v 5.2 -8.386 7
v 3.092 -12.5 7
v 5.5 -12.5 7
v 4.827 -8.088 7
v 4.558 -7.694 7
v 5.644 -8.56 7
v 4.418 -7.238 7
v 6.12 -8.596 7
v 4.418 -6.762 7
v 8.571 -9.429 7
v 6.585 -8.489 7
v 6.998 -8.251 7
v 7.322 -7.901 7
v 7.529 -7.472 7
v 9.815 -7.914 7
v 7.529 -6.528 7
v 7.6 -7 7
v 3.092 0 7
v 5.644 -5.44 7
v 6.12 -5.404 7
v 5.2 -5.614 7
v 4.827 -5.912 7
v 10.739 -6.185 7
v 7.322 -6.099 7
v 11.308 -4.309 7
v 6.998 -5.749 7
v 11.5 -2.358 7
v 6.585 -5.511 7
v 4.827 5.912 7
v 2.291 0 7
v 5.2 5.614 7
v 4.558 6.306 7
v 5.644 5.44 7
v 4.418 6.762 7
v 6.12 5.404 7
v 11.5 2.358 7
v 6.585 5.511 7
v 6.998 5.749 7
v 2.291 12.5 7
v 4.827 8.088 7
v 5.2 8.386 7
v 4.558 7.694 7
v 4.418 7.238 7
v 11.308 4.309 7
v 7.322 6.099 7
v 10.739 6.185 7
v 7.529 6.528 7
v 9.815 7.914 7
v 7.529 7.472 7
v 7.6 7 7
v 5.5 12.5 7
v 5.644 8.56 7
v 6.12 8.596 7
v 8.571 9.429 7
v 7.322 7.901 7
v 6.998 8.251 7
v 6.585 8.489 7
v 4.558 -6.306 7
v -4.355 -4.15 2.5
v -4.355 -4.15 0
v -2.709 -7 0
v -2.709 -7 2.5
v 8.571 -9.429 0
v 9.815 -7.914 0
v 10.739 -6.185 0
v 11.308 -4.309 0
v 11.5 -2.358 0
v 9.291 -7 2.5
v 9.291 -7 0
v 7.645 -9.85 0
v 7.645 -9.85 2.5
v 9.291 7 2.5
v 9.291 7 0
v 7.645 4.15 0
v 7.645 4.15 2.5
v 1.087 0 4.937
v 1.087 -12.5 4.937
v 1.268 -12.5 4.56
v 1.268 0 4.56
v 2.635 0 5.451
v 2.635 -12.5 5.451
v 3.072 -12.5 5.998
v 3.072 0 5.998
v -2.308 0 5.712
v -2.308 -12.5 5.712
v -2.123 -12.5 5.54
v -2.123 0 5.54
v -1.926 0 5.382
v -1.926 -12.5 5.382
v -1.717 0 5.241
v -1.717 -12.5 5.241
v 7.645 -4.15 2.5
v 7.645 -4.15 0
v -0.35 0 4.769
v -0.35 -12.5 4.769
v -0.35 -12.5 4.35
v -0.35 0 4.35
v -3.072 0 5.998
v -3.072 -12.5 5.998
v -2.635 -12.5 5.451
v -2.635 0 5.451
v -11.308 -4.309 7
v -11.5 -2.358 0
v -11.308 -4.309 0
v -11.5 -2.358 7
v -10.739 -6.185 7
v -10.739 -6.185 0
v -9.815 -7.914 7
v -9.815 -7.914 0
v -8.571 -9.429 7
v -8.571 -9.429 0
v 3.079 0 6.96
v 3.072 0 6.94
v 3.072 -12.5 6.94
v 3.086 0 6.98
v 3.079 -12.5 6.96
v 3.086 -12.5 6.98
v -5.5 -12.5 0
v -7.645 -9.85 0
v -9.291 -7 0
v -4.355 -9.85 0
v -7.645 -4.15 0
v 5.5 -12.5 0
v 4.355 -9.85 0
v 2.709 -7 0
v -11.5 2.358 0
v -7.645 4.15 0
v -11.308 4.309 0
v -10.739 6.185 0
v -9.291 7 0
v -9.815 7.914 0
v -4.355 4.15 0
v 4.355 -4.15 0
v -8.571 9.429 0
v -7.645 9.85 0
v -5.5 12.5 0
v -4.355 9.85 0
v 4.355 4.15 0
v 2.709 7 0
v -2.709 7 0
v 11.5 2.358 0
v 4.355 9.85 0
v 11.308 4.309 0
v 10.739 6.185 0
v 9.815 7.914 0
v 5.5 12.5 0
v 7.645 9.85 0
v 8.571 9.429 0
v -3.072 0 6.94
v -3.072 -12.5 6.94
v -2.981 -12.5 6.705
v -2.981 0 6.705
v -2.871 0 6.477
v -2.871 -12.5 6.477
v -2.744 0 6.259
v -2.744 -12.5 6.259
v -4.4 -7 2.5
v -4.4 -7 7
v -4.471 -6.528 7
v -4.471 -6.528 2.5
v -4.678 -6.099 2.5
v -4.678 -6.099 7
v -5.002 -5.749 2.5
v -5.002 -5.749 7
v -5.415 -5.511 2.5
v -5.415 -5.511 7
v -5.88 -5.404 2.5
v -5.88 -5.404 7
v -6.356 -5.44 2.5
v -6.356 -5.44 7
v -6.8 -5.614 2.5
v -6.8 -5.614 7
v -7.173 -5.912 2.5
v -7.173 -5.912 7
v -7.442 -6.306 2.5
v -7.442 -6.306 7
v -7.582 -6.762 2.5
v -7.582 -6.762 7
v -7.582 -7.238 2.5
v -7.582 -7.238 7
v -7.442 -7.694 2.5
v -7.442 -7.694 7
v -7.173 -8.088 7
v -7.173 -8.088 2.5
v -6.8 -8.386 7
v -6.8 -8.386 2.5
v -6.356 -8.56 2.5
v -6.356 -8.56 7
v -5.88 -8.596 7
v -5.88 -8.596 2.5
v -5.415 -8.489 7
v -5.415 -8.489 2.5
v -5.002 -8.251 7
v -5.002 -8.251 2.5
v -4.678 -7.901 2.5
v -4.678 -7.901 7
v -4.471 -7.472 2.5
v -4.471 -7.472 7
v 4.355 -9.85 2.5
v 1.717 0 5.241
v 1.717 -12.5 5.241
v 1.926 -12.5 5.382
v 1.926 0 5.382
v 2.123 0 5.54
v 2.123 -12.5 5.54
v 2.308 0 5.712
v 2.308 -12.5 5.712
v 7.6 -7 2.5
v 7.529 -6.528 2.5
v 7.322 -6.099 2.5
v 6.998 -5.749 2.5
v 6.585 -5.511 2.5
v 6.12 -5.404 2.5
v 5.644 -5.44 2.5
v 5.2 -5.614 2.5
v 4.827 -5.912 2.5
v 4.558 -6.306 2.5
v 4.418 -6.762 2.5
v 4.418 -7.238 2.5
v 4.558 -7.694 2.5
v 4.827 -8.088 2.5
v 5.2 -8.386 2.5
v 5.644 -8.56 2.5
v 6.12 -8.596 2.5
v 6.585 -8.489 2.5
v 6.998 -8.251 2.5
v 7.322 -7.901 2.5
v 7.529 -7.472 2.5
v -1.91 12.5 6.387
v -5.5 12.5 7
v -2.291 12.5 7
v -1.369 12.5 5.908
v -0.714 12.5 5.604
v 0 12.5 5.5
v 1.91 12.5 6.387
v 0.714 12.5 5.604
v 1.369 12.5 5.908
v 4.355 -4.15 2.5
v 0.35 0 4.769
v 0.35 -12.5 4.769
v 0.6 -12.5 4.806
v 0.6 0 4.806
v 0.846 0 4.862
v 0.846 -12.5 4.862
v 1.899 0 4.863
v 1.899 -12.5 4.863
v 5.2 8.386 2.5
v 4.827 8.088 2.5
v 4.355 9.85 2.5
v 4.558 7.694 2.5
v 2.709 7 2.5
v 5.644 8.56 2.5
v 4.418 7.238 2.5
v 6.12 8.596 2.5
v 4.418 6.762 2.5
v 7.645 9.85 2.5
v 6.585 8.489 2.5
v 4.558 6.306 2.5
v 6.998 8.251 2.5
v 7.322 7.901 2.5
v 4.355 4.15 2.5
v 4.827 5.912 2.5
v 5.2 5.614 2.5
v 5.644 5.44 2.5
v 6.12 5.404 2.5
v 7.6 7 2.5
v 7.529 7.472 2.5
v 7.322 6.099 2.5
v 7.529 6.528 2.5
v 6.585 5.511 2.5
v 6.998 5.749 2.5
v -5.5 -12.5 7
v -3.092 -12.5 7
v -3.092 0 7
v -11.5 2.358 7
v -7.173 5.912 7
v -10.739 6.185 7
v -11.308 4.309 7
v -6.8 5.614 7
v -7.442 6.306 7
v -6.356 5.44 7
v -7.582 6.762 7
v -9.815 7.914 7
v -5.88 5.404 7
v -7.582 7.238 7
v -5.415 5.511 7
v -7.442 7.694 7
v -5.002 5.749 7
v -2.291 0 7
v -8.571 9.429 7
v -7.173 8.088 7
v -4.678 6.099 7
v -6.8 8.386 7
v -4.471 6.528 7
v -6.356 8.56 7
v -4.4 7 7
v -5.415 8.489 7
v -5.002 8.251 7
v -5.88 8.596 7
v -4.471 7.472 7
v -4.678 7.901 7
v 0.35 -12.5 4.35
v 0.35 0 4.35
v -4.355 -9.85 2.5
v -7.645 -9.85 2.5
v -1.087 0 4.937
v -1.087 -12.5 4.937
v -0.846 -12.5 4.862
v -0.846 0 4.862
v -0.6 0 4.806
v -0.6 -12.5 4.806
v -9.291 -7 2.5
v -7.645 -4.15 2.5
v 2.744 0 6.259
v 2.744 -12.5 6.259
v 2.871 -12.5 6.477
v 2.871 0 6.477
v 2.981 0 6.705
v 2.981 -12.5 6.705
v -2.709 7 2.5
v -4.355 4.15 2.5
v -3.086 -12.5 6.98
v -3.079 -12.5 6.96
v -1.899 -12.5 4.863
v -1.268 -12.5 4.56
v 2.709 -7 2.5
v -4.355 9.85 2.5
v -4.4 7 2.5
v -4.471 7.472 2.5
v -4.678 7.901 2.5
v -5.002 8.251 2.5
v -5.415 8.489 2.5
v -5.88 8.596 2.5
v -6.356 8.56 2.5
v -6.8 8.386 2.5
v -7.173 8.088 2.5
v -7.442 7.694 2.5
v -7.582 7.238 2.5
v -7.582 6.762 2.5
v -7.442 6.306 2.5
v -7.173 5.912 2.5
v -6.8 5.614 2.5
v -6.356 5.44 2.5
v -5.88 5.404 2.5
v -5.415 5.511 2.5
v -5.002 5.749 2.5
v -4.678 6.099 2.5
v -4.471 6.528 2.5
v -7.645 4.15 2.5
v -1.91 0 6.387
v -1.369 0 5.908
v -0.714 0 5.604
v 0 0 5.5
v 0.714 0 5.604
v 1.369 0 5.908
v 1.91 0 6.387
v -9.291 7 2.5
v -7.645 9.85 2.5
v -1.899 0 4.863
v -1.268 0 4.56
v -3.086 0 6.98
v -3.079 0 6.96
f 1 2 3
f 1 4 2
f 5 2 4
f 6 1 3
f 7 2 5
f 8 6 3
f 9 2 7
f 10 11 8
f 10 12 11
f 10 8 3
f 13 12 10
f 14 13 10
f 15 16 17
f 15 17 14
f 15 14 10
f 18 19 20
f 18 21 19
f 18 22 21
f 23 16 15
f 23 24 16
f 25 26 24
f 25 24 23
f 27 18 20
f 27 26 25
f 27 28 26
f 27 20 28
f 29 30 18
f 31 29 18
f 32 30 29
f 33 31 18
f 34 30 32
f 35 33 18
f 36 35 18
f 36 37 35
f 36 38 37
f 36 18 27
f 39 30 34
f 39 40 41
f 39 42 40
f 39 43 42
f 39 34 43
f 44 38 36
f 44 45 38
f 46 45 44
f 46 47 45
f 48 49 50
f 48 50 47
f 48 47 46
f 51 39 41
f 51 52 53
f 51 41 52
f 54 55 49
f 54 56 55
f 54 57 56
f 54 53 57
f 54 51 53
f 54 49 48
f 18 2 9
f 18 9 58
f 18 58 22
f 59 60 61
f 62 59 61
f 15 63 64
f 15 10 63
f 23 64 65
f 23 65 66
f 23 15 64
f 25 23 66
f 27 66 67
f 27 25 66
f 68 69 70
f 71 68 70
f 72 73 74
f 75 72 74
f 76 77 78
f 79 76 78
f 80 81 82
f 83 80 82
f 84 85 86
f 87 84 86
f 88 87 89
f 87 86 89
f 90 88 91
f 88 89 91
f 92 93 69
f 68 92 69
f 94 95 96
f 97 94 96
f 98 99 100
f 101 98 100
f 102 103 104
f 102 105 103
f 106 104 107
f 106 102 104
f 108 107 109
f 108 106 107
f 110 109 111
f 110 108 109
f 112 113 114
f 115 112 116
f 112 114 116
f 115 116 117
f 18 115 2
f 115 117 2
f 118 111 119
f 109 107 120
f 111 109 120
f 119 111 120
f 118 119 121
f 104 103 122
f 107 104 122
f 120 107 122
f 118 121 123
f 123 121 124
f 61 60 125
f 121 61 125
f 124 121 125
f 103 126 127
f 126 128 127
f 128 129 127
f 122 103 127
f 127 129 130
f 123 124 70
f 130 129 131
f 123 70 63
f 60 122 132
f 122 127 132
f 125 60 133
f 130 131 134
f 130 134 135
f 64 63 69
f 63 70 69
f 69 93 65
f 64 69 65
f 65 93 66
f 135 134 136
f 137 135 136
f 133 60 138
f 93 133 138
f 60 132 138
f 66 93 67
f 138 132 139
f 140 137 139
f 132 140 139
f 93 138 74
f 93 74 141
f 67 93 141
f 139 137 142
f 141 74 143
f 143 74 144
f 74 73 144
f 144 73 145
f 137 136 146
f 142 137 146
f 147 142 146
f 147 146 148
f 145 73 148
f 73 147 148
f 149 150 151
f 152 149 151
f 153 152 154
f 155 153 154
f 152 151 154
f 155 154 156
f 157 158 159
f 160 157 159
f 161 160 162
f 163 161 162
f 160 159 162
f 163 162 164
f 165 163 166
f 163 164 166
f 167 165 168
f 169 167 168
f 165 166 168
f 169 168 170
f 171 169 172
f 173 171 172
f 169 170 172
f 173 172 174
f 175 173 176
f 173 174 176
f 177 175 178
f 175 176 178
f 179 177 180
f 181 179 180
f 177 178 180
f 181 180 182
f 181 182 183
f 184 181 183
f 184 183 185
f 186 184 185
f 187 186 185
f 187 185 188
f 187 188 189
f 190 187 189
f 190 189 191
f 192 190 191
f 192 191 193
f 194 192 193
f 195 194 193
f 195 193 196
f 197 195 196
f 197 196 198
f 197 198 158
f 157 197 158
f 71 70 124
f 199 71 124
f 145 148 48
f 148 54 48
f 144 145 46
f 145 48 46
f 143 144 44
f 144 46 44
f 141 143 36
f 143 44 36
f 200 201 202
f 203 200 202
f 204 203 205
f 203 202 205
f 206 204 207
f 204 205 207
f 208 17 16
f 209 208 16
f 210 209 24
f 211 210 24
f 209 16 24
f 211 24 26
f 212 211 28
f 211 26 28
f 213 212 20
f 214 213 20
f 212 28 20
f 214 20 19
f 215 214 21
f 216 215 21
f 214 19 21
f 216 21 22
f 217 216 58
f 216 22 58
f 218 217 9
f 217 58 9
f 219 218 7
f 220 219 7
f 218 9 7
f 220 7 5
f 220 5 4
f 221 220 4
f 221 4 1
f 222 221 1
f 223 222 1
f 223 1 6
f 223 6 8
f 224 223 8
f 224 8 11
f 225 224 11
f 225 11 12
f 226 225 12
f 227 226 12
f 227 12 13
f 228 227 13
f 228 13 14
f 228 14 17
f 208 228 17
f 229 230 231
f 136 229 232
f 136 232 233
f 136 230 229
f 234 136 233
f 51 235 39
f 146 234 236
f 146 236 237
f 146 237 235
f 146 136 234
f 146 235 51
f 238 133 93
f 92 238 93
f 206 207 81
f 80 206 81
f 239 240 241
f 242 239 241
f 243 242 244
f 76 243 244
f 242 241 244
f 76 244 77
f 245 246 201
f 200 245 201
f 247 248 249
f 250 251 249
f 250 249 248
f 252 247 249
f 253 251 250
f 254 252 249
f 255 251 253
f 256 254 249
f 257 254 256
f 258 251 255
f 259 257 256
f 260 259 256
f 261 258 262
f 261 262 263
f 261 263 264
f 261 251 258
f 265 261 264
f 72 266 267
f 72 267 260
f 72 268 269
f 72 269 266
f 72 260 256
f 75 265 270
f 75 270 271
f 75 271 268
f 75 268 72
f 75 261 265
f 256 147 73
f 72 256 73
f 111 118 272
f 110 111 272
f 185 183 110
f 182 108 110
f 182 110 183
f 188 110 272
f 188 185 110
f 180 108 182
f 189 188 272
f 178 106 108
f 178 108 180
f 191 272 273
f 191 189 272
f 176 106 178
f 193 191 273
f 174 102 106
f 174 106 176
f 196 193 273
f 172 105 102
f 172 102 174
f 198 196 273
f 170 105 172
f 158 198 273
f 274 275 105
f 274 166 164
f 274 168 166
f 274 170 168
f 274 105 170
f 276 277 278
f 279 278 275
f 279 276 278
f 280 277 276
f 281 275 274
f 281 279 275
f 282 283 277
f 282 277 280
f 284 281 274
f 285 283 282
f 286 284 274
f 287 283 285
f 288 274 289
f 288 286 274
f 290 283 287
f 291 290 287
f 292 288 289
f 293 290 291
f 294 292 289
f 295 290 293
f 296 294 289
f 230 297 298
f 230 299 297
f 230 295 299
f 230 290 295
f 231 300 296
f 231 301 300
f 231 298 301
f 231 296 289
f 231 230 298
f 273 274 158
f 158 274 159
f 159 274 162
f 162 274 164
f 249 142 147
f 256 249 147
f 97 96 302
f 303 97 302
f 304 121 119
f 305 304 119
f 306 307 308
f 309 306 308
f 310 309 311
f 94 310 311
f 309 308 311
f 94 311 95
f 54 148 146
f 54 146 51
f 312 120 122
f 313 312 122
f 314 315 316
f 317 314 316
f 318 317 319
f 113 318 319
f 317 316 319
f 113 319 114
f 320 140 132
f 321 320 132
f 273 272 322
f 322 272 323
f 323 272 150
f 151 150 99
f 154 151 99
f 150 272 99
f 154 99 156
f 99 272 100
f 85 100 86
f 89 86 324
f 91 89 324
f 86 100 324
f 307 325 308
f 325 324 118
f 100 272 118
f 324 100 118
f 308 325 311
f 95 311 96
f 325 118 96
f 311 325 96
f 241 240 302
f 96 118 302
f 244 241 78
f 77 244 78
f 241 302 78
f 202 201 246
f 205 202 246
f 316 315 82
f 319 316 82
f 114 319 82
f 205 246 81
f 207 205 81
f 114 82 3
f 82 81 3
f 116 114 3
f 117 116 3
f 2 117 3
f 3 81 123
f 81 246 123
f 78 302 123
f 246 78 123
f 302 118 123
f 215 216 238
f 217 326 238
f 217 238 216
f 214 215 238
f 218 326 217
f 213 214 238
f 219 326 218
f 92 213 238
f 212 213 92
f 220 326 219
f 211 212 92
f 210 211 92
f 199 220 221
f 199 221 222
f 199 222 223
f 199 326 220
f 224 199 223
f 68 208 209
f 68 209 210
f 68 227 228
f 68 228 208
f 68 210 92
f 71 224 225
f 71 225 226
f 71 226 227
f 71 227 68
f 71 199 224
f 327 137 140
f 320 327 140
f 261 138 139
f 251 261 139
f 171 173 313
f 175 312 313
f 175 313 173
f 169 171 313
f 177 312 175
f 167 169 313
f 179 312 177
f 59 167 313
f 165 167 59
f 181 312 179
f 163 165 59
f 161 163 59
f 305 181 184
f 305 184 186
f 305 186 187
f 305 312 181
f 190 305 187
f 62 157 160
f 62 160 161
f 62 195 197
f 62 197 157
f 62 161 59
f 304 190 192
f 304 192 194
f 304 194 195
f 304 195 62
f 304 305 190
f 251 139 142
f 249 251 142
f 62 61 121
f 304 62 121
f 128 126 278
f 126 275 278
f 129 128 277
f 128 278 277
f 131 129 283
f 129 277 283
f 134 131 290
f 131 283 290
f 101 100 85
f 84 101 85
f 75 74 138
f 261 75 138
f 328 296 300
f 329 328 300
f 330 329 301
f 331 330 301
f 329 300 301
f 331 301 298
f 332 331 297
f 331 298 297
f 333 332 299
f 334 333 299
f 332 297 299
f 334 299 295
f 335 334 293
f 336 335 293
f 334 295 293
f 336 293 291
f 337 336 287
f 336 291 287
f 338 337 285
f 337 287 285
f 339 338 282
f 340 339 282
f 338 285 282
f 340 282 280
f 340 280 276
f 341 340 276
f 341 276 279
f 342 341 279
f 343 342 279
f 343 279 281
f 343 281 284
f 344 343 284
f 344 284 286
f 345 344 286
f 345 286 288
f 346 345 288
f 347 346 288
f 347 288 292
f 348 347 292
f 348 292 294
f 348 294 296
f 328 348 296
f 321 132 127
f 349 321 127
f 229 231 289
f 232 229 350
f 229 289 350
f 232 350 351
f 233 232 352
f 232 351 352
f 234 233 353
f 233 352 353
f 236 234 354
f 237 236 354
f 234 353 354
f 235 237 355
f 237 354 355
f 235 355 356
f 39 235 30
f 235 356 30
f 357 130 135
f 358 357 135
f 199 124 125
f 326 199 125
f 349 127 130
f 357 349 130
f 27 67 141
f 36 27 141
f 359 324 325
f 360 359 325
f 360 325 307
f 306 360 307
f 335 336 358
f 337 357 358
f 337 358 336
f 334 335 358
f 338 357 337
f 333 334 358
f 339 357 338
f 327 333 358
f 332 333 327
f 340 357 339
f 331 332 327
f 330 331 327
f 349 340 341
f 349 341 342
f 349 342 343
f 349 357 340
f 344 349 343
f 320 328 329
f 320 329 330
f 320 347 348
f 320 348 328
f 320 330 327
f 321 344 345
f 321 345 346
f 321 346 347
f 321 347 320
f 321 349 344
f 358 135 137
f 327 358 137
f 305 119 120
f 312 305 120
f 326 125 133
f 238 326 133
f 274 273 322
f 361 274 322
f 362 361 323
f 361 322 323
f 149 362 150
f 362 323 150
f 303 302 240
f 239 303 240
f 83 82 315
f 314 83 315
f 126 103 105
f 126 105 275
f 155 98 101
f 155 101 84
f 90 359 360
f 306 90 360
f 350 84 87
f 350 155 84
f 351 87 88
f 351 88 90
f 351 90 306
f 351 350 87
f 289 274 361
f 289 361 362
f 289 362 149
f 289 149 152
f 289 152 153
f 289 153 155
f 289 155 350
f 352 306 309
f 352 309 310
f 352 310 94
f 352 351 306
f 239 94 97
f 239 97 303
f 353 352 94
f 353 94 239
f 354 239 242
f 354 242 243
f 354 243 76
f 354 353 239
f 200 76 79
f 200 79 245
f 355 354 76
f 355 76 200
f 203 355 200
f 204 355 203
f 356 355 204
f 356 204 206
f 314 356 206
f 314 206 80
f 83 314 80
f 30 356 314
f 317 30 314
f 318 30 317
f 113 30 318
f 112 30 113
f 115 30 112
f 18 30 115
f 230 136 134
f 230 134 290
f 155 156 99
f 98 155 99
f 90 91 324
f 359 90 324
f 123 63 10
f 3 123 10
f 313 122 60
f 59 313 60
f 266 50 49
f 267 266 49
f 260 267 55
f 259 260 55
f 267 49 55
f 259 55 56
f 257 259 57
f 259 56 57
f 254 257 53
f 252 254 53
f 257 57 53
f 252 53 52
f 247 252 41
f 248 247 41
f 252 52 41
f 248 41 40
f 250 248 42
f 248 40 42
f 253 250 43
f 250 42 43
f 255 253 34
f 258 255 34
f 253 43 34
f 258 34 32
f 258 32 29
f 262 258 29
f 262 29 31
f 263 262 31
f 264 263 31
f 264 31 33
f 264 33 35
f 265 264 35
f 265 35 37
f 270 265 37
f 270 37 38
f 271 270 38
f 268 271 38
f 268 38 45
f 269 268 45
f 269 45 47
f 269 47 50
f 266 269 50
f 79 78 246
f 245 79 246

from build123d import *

# Parameters (mm, degrees)
F0_W      = 23
F0_H      = 25
F1_DEPTH  = 7
F3_DEPTH  = 25.001
F4_DEPTH  = 12.5
F5_SIZE   = 6
F6_R      = 10
F7_R      = 1.6
F8_DEPTH  = 25
F10_DEPTH = 2.5


with BuildPart() as f1:
    # F0 (on Top) → F1 (new body)
    with BuildSketch(Plane.XY):
        Rectangle(F0_W, F0_H)
    extrude(amount=F1_DEPTH)

    # F2 (on face) → F3 (cut, through all)
    with BuildSketch(Plane.XZ.offset(12.5)):
        with BuildLine():
            Line((0, 7), (-2.2912878475, 7))
            ThreePointArc((-2.2912878475, 7), (0, 5.5), (2.2912878475, 7))
            Line((2.2912878475, 7), (0, 7))
        make_face()
    extrude(amount=-F3_DEPTH, mode=Mode.SUBTRACT)

    # F2 (on face) → F4 (cut)
    with BuildSketch(Plane.XZ.offset(12.5)):
        with BuildLine():
            ThreePointArc((2.2912878475, 7), (0, 5.5), (-2.2912878475, 7))
            Line((-2.2912878475, 7), (-2.8084005449, 7))
            Line((-2.8084005449, 7), (-3.0722061624, 6.9397880893))
            ThreePointArc((-3.0722061624, 6.9397880893), (-2.9281488207, 6.5898778479), (-2.7443962613, 6.2590838157))
            Line((-2.7443962613, 6.2590838157), (-2.4464411557, 6.4966950836))
            Line((-2.4464411557, 6.4966950836), (-2.0099982944, 5.9494130458))
            Line((-2.0099982944, 5.9494130458), (-2.3079534, 5.711801778))
            ThreePointArc((-2.3079534, 5.711801778), (-2.026341856, 5.459047682), (-1.7172603691, 5.2407398048))
            Line((-1.7172603691, 5.2407398048), (-1.5519077603, 5.5840980352))
            Line((-1.5519077603, 5.5840980352), (-0.9212295527, 5.2803794178))
            Line((-0.9212295527, 5.2803794178), (-1.0865821616, 4.9370211875))
            ThreePointArc((-1.0865821616, 4.9370211875), (-0.7231930354, 4.8314842854), (-0.35, 4.7689011157))
            Line((-0.35, 4.7689011157), (-0.35, 5.15))
            Line((-0.35, 5.15), (0.35, 5.15))
            Line((0.35, 5.15), (0.35, 4.7689011157))
            ThreePointArc((0.35, 4.7689011157), (0.7231930354, 4.8314842854), (1.0865821616, 4.9370211875))
            Line((1.0865821616, 4.9370211875), (0.9212295527, 5.2803794178))
            Line((0.9212295527, 5.2803794178), (1.5519077603, 5.5840980352))
            Line((1.5519077603, 5.5840980352), (1.7172603691, 5.2407398048))
            ThreePointArc((1.7172603691, 5.2407398048), (2.026341856, 5.459047682), (2.3079534, 5.711801778))
            Line((2.3079534, 5.711801778), (2.0099982944, 5.9494130458))
            Line((2.0099982944, 5.9494130458), (2.4464411557, 6.4966950836))
            Line((2.4464411557, 6.4966950836), (2.7443962613, 6.2590838157))
            ThreePointArc((2.7443962613, 6.2590838157), (2.9281488207, 6.5898778479), (3.0722061624, 6.9397880893))
            Line((3.0722061624, 6.9397880893), (2.8084005449, 7))
            Line((2.8084005449, 7), (2.2912878475, 7))
        make_face()
        with BuildLine():
            Line((3.0719063417, 5.9979032421), (2.7443962613, 6.2590838157))
            ThreePointArc((2.7443962613, 6.2590838157), (2.540952318, 5.973658144), (2.3079534, 5.711801778))
            Line((2.3079534, 5.711801778), (2.6354634804, 5.4506212044))
            Line((2.6354634804, 5.4506212044), (3.0719063417, 5.9979032421))
        make_face()
        with BuildLine():
            ThreePointArc((2.3079534, 5.711801778), (2.540952318, 5.973658144), (2.7443962613, 6.2590838157))
            Line((2.7443962613, 6.2590838157), (2.4464411557, 6.4966950836))
            Line((2.4464411557, 6.4966950836), (2.0099982944, 5.9494130458))
            Line((2.0099982944, 5.9494130458), (2.3079534, 5.711801778))
        make_face()
        with BuildLine():
            Line((1.8990147515, 4.8633229408), (1.7172603691, 5.2407398048))
            ThreePointArc((1.7172603691, 5.2407398048), (1.4101221521, 5.0718511793), (1.0865821616, 4.9370211875))
            Line((1.0865821616, 4.9370211875), (1.268336544, 4.5596043235))
            Line((1.268336544, 4.5596043235), (1.8990147515, 4.8633229408))
        make_face()
        with BuildLine():
            ThreePointArc((1.0865821616, 4.9370211875), (1.4101221521, 5.0718511793), (1.7172603691, 5.2407398048))
            Line((1.7172603691, 5.2407398048), (1.5519077603, 5.5840980352))
            Line((1.5519077603, 5.5840980352), (0.9212295527, 5.2803794178))
            Line((0.9212295527, 5.2803794178), (1.0865821616, 4.9370211875))
        make_face()
        with BuildLine():
            ThreePointArc((0.35, 4.7689011157), (0, 4.75), (-0.35, 4.7689011157))
            Line((-0.35, 4.7689011157), (-0.35, 4.35))
            Line((-0.35, 4.35), (0.35, 4.35))
            Line((0.35, 4.35), (0.35, 4.7689011157))
        make_face()
        with BuildLine():
            Line((-0.35, 5.15), (-0.35, 4.7689011157))
            ThreePointArc((-0.35, 4.7689011157), (0, 4.75), (0.35, 4.7689011157))
            Line((0.35, 4.7689011157), (0.35, 5.15))
            Line((0.35, 5.15), (-0.35, 5.15))
        make_face()
        with BuildLine():
            ThreePointArc((-1.0865821616, 4.9370211875), (-1.4101221521, 5.0718511793), (-1.7172603691, 5.2407398048))
            Line((-1.7172603691, 5.2407398048), (-1.8990147515, 4.8633229408))
            Line((-1.8990147515, 4.8633229408), (-1.268336544, 4.5596043235))
            Line((-1.268336544, 4.5596043235), (-1.0865821616, 4.9370211875))
        make_face()
        with BuildLine():
            Line((-1.5519077603, 5.5840980352), (-1.7172603691, 5.2407398048))
            ThreePointArc((-1.7172603691, 5.2407398048), (-1.4101221521, 5.0718511793), (-1.0865821616, 4.9370211875))
            Line((-1.0865821616, 4.9370211875), (-0.9212295527, 5.2803794178))
            Line((-0.9212295527, 5.2803794178), (-1.5519077603, 5.5840980352))
        make_face()
        with BuildLine():
            ThreePointArc((-2.3079534, 5.711801778), (-2.540952318, 5.973658144), (-2.7443962613, 6.2590838157))
            Line((-2.7443962613, 6.2590838157), (-3.0719063417, 5.9979032421))
            Line((-3.0719063417, 5.9979032421), (-2.6354634804, 5.4506212044))
            Line((-2.6354634804, 5.4506212044), (-2.3079534, 5.711801778))
        make_face()
        with BuildLine():
            Line((-2.4464411557, 6.4966950836), (-2.7443962613, 6.2590838157))
            ThreePointArc((-2.7443962613, 6.2590838157), (-2.540952318, 5.973658144), (-2.3079534, 5.711801778))
            Line((-2.3079534, 5.711801778), (-2.0099982944, 5.9494130458))
            Line((-2.0099982944, 5.9494130458), (-2.4464411557, 6.4966950836))
        make_face()
        with BuildLine():
            Line((3.0923292192, 7), (2.8084005449, 7))
            Line((2.8084005449, 7), (3.0722061624, 6.9397880893))
            ThreePointArc((3.0722061624, 6.9397880893), (3.0824147168, 6.969844908), (3.0923292192, 7))
        make_face()
        with BuildLine():
            Line((-3.0722061624, 6.9397880893), (-2.8084005449, 7))
            Line((-2.8084005449, 7), (-3.0923292192, 7))
            ThreePointArc((-3.0923292192, 7), (-3.0824147168, 6.969844908), (-3.0722061624, 6.9397880893))
        make_face()
    extrude(amount=-F4_DEPTH, mode=Mode.SUBTRACT)

    # F5
    f5_edges = [f1.edges().sort_by_distance(p)[0] for p in [
        (11.5, -12.5, 3.5),
        (-11.5, -12.5, 3.5),
        (11.5, 12.5, 3.5),
        (-11.5, 12.5, 3.5),
    ]]
    chamfer(f5_edges, length=F5_SIZE)

    # F6
    f6_edges = [f1.edges().sort_by_distance(p)[0] for p in [
        (11.5, 6.5, 3.5),
        (11.5, -6.5, 3.5),
        (-11.5, 6.5, 3.5),
        (-11.5, -6.5, 3.5),
    ]]
    fillet(f6_edges, radius=F6_R)

    # F7 (on face) → F8 (cut)
    with BuildSketch(Plane.XY.offset(7)):
        with Locations((6, -7)):
            Circle(F7_R)
        with Locations((-6, -7)):
            Circle(F7_R)
        with Locations((-6, 7)):
            Circle(F7_R)
        with Locations((6, 7)):
            Circle(F7_R)
    extrude(amount=-F8_DEPTH, mode=Mode.SUBTRACT)

    # F9 (on face) → F10 (cut)
    with BuildSketch(Plane(origin=(0, 0, 0), x_dir=(1, 0, 0), z_dir=(0, 0, -1))):
        Polygon((-4.3545517328, 4.15), (-2.7091034656, 7), (-4.3545517328, 9.85), (-7.6454482672, 9.85), (-9.2908965344, 7), (-7.6454482672, 4.15), align=None)
        Polygon((-9.2908965344, -7), (-7.6454482672, -9.85), (-4.3545517328, -9.85), (-2.7091034656, -7), (-4.3545517328, -4.15), (-7.6454482672, -4.15), align=None)
        Polygon((2.7091034656, 7), (4.3545517328, 4.15), (7.6454482672, 4.15), (9.2908965344, 7), (7.6454482672, 9.85), (4.3545517328, 9.85), align=None)
        Polygon((2.7091034656, -7), (4.3545517328, -9.85), (7.6454482672, -9.85), (9.2908965344, -7), (7.6454482672, -4.15), (4.3545517328, -4.15), align=None)
    extrude(amount=-F10_DEPTH, mode=Mode.SUBTRACT)


solid = f1.part
